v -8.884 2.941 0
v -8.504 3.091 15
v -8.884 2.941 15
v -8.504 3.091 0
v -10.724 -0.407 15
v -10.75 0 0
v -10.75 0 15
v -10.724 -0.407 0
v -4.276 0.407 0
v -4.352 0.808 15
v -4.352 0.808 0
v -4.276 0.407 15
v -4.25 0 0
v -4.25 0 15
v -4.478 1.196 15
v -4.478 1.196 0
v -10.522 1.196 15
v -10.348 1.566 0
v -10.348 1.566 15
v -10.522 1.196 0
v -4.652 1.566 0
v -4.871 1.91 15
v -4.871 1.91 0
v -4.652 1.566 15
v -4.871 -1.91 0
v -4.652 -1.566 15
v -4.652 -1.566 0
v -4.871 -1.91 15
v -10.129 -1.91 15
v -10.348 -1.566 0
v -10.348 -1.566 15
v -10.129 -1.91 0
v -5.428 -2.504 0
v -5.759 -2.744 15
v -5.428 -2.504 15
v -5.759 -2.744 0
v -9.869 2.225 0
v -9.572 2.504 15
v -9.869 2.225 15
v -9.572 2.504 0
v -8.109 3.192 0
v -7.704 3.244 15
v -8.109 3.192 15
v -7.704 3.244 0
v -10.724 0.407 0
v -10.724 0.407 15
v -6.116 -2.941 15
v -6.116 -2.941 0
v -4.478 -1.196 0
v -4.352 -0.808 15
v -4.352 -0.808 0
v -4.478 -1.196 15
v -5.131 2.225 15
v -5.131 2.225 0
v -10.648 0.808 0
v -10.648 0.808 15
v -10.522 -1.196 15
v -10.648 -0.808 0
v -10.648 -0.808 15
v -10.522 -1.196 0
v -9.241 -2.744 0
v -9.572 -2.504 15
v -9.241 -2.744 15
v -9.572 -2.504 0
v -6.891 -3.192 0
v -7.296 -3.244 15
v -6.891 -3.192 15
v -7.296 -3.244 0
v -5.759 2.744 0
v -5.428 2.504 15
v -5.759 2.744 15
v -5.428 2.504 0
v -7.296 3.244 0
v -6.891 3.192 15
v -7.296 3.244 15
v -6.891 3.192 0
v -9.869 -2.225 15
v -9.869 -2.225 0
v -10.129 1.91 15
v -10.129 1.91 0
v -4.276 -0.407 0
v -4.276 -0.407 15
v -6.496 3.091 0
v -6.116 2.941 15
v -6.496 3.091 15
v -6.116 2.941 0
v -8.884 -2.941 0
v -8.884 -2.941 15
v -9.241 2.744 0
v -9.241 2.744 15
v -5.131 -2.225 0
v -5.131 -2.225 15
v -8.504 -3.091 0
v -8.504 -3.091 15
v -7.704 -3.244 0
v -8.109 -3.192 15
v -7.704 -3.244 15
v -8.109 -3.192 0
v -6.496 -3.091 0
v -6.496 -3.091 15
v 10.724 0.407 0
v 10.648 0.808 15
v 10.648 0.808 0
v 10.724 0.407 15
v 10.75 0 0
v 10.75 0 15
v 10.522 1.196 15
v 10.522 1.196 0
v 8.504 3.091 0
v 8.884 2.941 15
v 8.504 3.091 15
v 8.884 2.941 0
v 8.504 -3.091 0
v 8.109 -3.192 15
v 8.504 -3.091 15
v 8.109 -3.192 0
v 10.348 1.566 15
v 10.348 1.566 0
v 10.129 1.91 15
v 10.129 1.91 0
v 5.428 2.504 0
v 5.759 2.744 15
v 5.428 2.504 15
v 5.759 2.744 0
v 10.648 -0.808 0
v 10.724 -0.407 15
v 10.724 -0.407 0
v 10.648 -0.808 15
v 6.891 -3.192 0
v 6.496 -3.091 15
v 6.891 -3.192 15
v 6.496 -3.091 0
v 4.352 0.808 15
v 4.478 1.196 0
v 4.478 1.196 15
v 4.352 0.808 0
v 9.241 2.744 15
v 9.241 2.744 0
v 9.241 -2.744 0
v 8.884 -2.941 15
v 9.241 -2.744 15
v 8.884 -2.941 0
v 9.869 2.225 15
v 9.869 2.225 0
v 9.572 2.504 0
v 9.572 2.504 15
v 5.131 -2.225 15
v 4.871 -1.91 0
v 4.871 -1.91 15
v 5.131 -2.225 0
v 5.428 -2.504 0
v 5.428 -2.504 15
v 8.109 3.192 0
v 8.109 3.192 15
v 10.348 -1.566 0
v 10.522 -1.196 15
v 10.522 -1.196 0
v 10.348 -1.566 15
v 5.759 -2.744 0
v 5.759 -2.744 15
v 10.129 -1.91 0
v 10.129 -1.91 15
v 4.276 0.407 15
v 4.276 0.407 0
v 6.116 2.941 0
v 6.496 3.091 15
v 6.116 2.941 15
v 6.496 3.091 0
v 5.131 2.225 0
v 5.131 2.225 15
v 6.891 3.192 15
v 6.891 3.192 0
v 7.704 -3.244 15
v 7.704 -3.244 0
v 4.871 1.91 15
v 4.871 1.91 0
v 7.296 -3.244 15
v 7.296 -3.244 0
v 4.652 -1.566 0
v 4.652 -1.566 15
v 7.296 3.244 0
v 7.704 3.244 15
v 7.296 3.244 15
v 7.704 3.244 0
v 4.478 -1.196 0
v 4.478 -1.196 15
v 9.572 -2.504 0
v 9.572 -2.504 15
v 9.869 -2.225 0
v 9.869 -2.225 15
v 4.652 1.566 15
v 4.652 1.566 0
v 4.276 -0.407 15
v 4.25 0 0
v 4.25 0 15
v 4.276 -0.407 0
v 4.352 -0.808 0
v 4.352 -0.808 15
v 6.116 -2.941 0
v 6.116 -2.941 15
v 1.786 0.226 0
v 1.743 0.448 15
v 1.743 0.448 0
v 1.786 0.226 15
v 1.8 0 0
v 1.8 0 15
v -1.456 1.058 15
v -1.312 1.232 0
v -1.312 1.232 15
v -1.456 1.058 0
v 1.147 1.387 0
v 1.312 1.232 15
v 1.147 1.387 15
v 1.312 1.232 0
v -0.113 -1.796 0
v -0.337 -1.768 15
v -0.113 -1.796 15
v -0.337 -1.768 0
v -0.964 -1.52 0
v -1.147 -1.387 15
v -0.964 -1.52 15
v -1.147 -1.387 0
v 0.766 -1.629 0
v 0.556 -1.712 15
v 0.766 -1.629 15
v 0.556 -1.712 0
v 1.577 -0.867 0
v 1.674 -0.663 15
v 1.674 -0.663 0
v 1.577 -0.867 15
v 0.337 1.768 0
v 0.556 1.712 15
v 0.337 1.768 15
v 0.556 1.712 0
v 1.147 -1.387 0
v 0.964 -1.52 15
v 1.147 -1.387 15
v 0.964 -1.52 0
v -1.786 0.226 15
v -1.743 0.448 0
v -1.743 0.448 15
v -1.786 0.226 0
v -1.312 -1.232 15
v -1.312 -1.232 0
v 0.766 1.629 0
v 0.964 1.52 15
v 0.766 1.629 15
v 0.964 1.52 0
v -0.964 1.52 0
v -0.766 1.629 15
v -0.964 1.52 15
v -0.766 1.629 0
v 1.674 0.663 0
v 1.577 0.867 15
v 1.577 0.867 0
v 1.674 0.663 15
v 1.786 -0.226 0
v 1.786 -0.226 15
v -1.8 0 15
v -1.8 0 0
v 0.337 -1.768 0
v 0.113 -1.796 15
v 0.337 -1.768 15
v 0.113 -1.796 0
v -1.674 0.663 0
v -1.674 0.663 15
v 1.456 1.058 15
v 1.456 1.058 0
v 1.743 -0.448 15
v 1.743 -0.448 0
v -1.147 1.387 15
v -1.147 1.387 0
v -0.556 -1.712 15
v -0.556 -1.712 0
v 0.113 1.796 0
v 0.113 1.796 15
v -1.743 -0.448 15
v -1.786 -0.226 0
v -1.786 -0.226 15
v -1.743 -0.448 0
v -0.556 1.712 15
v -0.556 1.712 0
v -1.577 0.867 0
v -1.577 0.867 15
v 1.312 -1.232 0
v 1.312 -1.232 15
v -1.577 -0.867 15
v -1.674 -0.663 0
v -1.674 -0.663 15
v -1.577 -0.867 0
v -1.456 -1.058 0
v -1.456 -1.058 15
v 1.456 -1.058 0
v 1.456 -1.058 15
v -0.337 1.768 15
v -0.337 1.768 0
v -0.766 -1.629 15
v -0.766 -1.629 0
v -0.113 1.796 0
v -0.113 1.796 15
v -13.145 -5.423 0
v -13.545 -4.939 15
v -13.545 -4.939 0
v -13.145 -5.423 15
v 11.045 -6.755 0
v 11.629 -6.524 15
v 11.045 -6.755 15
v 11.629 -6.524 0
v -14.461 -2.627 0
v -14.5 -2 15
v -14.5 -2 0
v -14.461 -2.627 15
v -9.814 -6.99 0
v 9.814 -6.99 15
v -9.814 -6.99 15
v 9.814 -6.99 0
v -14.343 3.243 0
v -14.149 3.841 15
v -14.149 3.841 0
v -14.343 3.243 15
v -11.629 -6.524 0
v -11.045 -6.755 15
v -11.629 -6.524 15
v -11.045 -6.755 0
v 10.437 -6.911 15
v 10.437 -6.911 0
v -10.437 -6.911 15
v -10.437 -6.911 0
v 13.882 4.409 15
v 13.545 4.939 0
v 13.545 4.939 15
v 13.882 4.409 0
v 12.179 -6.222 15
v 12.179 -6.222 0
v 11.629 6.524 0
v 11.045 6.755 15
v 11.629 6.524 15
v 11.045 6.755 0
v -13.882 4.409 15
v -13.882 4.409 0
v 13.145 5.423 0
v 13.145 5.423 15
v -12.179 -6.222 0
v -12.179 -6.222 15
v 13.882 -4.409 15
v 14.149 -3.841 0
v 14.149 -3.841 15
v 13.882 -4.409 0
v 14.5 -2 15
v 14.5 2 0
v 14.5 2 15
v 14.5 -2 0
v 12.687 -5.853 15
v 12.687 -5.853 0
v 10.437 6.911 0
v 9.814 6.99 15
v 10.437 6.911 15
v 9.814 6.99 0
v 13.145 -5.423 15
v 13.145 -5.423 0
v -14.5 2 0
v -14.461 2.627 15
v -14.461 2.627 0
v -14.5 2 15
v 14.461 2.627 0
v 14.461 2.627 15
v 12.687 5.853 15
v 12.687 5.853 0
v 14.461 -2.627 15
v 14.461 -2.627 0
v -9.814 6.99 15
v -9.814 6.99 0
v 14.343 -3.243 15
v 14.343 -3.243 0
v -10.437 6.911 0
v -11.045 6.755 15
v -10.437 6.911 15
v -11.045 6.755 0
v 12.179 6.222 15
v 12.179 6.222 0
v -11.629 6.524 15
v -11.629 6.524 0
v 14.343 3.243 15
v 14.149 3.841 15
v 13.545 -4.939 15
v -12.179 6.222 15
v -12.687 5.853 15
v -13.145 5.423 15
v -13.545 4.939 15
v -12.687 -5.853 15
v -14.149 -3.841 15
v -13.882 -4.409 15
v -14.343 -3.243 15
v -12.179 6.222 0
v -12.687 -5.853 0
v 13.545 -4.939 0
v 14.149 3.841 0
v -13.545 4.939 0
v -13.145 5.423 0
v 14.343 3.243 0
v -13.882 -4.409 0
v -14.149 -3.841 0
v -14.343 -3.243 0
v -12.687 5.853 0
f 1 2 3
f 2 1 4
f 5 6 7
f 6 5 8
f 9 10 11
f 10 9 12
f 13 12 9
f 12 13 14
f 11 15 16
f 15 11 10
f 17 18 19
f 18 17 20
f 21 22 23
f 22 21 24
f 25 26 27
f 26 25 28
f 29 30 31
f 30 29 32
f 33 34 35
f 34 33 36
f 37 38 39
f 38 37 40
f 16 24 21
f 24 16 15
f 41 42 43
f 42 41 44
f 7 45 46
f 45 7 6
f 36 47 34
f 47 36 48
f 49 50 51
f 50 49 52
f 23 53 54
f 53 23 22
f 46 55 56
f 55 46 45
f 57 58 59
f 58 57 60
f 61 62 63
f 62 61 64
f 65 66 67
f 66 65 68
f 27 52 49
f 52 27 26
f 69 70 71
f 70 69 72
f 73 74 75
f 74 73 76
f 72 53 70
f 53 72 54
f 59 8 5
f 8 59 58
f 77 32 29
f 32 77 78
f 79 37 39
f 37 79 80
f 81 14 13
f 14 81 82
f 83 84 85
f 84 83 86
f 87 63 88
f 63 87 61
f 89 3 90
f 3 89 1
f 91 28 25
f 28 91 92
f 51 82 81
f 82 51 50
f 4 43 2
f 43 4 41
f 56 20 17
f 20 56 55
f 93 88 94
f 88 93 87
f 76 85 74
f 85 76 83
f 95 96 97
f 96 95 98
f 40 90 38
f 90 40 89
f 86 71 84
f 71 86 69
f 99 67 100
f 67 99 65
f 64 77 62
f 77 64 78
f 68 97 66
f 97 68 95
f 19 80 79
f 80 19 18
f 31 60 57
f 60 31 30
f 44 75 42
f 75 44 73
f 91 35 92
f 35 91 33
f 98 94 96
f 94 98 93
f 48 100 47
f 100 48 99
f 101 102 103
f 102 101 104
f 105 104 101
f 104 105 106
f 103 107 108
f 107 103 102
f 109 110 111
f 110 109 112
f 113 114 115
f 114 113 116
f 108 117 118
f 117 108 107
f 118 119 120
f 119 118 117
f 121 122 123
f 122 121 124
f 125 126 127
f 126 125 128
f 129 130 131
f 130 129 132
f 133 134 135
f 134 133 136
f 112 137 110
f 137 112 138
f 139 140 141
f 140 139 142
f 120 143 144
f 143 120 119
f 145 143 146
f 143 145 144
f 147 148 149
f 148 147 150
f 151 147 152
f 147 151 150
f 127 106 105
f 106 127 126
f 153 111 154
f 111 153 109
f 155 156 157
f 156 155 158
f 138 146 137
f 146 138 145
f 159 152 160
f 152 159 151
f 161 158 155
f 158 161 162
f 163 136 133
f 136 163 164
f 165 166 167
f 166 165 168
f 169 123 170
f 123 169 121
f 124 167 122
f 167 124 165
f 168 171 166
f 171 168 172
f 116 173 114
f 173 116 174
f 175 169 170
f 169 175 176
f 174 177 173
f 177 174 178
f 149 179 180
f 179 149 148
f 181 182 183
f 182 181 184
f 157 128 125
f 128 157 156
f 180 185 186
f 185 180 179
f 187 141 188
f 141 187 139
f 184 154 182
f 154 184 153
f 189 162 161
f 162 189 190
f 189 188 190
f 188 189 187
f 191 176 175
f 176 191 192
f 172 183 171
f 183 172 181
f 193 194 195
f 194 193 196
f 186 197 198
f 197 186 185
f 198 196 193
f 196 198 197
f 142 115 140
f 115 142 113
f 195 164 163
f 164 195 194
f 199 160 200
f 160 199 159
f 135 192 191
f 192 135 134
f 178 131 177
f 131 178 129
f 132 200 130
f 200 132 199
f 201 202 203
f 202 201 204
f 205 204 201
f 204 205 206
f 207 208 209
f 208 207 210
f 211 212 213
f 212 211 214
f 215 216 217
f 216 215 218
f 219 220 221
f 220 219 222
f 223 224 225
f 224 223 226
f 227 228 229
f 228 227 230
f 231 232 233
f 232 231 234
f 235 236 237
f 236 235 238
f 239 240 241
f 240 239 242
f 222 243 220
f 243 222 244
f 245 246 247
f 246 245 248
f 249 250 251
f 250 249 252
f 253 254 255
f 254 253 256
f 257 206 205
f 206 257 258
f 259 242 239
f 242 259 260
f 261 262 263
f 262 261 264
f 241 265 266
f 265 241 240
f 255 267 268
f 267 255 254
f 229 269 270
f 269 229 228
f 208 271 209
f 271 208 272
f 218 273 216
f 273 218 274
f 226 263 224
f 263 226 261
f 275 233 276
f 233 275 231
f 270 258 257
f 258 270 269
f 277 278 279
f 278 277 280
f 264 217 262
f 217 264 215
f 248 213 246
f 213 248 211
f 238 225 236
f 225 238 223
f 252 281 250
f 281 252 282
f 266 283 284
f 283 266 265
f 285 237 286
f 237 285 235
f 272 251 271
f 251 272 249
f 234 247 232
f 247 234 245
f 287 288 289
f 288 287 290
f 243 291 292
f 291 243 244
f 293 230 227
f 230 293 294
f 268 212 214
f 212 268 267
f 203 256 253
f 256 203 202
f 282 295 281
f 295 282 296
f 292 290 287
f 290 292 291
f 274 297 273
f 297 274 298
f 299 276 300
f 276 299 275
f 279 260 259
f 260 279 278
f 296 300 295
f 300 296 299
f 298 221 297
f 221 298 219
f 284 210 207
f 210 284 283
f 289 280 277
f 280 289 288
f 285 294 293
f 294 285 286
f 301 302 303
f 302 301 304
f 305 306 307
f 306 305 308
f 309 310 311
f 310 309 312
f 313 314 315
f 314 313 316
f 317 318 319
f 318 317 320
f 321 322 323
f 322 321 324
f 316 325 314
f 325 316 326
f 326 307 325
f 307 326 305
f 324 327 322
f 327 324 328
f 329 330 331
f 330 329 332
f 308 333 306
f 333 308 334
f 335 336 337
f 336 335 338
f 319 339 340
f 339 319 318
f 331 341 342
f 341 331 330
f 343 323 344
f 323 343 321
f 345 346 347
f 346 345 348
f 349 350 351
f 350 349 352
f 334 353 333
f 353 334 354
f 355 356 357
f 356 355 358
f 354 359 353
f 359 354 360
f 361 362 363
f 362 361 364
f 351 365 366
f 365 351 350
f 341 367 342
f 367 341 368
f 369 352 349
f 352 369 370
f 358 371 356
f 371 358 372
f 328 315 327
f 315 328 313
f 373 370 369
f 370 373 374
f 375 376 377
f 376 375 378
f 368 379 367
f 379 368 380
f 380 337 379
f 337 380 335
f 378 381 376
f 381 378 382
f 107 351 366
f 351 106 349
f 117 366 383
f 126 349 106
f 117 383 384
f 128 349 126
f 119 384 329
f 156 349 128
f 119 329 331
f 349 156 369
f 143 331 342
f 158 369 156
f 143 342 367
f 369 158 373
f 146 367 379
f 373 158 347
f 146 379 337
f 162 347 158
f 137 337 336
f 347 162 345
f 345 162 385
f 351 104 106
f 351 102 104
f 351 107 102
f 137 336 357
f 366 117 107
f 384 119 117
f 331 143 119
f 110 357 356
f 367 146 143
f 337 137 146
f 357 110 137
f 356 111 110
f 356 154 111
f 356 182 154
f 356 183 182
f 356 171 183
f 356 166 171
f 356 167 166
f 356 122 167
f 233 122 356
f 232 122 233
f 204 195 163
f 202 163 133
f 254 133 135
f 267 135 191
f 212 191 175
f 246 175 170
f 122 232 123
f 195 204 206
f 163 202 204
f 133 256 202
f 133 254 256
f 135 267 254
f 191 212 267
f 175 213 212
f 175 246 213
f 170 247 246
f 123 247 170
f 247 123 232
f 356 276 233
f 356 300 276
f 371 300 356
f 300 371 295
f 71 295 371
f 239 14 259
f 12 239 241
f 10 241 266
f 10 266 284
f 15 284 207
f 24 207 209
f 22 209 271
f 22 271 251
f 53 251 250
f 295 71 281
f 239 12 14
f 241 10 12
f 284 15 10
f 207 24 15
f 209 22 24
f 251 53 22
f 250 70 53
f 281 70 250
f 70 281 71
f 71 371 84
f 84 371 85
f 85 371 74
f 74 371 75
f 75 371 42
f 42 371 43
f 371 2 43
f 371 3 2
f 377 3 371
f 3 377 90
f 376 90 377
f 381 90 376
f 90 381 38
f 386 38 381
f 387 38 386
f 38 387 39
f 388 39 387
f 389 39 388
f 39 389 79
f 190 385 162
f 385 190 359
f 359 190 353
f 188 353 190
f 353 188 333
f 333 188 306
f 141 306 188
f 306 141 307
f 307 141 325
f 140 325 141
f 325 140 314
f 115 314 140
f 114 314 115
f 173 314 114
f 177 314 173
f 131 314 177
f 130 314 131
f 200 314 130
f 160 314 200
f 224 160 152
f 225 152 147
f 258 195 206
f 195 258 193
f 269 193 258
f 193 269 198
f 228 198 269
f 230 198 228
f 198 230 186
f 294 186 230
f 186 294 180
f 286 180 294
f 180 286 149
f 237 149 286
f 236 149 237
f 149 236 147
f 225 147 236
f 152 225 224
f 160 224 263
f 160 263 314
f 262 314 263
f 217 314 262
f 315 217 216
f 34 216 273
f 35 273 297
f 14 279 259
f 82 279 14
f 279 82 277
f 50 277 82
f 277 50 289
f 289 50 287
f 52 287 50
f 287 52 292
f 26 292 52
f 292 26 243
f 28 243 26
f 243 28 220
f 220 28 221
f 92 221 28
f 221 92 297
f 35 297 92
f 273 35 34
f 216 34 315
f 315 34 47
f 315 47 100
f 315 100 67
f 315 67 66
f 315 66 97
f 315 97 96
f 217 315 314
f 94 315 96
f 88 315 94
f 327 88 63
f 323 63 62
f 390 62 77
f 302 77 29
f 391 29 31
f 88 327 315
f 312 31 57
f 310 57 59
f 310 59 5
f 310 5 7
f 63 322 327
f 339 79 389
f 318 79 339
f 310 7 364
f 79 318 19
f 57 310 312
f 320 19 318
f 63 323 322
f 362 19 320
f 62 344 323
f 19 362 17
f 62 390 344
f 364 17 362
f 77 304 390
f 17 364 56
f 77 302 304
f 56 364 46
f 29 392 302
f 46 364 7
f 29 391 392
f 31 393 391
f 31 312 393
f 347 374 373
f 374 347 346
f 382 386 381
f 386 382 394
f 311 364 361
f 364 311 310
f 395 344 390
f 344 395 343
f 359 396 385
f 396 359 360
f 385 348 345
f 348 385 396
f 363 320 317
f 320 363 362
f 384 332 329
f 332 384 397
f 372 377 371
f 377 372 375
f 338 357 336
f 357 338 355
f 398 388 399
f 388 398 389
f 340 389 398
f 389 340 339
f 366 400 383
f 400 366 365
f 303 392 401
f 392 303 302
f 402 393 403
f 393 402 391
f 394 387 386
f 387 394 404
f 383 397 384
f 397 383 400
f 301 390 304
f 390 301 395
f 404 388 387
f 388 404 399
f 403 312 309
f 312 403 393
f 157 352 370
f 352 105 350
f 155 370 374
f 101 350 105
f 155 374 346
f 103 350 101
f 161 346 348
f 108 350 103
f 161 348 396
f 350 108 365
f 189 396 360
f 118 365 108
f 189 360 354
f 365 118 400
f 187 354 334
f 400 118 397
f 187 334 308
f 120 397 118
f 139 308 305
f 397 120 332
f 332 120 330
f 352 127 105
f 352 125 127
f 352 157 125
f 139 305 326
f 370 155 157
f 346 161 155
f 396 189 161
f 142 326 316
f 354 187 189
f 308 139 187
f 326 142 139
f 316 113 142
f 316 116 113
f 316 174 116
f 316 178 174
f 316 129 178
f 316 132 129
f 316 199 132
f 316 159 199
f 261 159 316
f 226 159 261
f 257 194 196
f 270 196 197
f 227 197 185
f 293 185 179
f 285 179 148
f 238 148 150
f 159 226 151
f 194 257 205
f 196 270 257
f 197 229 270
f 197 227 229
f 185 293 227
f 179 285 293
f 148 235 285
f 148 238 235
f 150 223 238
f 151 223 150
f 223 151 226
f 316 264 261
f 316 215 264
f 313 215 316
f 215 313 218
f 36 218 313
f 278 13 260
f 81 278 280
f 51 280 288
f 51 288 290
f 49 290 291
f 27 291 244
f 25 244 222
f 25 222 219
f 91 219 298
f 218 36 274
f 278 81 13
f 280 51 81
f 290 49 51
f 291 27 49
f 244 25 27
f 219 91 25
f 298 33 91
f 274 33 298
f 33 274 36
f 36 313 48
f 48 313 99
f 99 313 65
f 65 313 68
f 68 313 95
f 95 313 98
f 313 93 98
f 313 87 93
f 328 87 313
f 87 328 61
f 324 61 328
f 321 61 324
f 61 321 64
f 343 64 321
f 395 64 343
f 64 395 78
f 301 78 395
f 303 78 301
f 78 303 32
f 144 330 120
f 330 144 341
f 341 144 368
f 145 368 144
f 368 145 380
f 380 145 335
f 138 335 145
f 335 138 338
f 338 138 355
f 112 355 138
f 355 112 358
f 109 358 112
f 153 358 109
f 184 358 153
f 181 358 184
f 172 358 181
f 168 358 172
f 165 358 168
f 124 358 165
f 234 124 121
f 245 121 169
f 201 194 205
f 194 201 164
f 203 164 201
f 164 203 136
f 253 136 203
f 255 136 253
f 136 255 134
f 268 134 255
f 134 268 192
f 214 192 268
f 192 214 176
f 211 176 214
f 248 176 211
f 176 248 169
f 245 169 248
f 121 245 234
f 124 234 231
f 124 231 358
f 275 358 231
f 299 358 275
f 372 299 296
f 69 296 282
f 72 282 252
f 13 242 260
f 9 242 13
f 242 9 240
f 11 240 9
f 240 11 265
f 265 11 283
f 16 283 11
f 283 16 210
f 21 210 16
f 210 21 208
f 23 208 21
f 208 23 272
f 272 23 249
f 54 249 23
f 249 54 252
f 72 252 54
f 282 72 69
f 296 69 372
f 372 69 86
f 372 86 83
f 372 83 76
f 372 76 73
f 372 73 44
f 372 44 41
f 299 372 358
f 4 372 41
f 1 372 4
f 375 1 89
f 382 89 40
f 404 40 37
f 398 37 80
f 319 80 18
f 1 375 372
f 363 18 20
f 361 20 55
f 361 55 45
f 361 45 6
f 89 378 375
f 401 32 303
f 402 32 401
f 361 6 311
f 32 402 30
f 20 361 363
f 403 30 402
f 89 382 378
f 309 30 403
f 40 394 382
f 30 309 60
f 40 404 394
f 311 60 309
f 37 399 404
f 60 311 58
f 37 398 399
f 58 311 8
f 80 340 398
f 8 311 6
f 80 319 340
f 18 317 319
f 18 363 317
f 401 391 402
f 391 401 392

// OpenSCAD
$fn = 50;


difference() {
	union() {
		translate(v = [0, 0, 0]) {
			rotate(a = [0, 0, 0]) {
				hull() {
					translate(v = [-9.5000000000, 2.0000000000, 0]) {
						rotate(a = [0, 0, 0]) {
							translate(v = [0, 0, 0]) {
								rotate(a = [0, 0, 0]) {
									cylinder(h = 15, r = 5);
								}
							}
						}
					}
					translate(v = [9.5000000000, 2.0000000000, 0]) {
						rotate(a = [0, 0, 0]) {
							translate(v = [0, 0, 0]) {
								rotate(a = [0, 0, 0]) {
									cylinder(h = 15, r = 5);
								}
							}
						}
					}
					translate(v = [-9.5000000000, -2.0000000000, 0]) {
						rotate(a = [0, 0, 0]) {
							translate(v = [0, 0, 0]) {
								rotate(a = [0, 0, 0]) {
									cylinder(h = 15, r = 5);
								}
							}
						}
					}
					translate(v = [9.5000000000, -2.0000000000, 0]) {
						rotate(a = [0, 0, 0]) {
							translate(v = [0, 0, 0]) {
								rotate(a = [0, 0, 0]) {
									cylinder(h = 15, r = 5);
								}
							}
						}
					}
				}
			}
		}
	}
	union() {
		translate(v = [-7.5000000000, 0.0000000000, 0]) {
			rotate(a = [0, 0, 0]) {
				translate(v = [0, 0, -50]) {
					rotate(a = [0, 0, 0]) {
						cylinder(h = 100, r = 3.2500000000);
					}
				}
			}
		}
		translate(v = [7.5000000000, 0.0000000000, 0]) {
			rotate(a = [0, 0, 0]) {
				translate(v = [0, 0, -50]) {
					rotate(a = [0, 0, 0]) {
						cylinder(h = 100, r = 3.2500000000);
					}
				}
			}
		}
		translate(v = [-7.5000000000, 0.0000000000, 0]) {
			rotate(a = [0, 0, 0]) {
				translate(v = [0, 0, -50]) {
					rotate(a = [0, 0, 0]) {
						cylinder(h = 100, r = 1.8000000000);
					}
				}
			}
		}
		translate(v = [0.0000000000, 0.0000000000, 0]) {
			rotate(a = [0, 0, 0]) {
				translate(v = [0, 0, -50]) {
					rotate(a = [0, 0, 0]) {
						cylinder(h = 100, r = 1.8000000000);
					}
				}
			}
		}
		translate(v = [7.5000000000, 0.0000000000, 0]) {
			rotate(a = [0, 0, 0]) {
				translate(v = [0, 0, -50]) {
					rotate(a = [0, 0, 0]) {
						cylinder(h = 100, r = 1.8000000000);
					}
				}
			}
		}
	}
}
